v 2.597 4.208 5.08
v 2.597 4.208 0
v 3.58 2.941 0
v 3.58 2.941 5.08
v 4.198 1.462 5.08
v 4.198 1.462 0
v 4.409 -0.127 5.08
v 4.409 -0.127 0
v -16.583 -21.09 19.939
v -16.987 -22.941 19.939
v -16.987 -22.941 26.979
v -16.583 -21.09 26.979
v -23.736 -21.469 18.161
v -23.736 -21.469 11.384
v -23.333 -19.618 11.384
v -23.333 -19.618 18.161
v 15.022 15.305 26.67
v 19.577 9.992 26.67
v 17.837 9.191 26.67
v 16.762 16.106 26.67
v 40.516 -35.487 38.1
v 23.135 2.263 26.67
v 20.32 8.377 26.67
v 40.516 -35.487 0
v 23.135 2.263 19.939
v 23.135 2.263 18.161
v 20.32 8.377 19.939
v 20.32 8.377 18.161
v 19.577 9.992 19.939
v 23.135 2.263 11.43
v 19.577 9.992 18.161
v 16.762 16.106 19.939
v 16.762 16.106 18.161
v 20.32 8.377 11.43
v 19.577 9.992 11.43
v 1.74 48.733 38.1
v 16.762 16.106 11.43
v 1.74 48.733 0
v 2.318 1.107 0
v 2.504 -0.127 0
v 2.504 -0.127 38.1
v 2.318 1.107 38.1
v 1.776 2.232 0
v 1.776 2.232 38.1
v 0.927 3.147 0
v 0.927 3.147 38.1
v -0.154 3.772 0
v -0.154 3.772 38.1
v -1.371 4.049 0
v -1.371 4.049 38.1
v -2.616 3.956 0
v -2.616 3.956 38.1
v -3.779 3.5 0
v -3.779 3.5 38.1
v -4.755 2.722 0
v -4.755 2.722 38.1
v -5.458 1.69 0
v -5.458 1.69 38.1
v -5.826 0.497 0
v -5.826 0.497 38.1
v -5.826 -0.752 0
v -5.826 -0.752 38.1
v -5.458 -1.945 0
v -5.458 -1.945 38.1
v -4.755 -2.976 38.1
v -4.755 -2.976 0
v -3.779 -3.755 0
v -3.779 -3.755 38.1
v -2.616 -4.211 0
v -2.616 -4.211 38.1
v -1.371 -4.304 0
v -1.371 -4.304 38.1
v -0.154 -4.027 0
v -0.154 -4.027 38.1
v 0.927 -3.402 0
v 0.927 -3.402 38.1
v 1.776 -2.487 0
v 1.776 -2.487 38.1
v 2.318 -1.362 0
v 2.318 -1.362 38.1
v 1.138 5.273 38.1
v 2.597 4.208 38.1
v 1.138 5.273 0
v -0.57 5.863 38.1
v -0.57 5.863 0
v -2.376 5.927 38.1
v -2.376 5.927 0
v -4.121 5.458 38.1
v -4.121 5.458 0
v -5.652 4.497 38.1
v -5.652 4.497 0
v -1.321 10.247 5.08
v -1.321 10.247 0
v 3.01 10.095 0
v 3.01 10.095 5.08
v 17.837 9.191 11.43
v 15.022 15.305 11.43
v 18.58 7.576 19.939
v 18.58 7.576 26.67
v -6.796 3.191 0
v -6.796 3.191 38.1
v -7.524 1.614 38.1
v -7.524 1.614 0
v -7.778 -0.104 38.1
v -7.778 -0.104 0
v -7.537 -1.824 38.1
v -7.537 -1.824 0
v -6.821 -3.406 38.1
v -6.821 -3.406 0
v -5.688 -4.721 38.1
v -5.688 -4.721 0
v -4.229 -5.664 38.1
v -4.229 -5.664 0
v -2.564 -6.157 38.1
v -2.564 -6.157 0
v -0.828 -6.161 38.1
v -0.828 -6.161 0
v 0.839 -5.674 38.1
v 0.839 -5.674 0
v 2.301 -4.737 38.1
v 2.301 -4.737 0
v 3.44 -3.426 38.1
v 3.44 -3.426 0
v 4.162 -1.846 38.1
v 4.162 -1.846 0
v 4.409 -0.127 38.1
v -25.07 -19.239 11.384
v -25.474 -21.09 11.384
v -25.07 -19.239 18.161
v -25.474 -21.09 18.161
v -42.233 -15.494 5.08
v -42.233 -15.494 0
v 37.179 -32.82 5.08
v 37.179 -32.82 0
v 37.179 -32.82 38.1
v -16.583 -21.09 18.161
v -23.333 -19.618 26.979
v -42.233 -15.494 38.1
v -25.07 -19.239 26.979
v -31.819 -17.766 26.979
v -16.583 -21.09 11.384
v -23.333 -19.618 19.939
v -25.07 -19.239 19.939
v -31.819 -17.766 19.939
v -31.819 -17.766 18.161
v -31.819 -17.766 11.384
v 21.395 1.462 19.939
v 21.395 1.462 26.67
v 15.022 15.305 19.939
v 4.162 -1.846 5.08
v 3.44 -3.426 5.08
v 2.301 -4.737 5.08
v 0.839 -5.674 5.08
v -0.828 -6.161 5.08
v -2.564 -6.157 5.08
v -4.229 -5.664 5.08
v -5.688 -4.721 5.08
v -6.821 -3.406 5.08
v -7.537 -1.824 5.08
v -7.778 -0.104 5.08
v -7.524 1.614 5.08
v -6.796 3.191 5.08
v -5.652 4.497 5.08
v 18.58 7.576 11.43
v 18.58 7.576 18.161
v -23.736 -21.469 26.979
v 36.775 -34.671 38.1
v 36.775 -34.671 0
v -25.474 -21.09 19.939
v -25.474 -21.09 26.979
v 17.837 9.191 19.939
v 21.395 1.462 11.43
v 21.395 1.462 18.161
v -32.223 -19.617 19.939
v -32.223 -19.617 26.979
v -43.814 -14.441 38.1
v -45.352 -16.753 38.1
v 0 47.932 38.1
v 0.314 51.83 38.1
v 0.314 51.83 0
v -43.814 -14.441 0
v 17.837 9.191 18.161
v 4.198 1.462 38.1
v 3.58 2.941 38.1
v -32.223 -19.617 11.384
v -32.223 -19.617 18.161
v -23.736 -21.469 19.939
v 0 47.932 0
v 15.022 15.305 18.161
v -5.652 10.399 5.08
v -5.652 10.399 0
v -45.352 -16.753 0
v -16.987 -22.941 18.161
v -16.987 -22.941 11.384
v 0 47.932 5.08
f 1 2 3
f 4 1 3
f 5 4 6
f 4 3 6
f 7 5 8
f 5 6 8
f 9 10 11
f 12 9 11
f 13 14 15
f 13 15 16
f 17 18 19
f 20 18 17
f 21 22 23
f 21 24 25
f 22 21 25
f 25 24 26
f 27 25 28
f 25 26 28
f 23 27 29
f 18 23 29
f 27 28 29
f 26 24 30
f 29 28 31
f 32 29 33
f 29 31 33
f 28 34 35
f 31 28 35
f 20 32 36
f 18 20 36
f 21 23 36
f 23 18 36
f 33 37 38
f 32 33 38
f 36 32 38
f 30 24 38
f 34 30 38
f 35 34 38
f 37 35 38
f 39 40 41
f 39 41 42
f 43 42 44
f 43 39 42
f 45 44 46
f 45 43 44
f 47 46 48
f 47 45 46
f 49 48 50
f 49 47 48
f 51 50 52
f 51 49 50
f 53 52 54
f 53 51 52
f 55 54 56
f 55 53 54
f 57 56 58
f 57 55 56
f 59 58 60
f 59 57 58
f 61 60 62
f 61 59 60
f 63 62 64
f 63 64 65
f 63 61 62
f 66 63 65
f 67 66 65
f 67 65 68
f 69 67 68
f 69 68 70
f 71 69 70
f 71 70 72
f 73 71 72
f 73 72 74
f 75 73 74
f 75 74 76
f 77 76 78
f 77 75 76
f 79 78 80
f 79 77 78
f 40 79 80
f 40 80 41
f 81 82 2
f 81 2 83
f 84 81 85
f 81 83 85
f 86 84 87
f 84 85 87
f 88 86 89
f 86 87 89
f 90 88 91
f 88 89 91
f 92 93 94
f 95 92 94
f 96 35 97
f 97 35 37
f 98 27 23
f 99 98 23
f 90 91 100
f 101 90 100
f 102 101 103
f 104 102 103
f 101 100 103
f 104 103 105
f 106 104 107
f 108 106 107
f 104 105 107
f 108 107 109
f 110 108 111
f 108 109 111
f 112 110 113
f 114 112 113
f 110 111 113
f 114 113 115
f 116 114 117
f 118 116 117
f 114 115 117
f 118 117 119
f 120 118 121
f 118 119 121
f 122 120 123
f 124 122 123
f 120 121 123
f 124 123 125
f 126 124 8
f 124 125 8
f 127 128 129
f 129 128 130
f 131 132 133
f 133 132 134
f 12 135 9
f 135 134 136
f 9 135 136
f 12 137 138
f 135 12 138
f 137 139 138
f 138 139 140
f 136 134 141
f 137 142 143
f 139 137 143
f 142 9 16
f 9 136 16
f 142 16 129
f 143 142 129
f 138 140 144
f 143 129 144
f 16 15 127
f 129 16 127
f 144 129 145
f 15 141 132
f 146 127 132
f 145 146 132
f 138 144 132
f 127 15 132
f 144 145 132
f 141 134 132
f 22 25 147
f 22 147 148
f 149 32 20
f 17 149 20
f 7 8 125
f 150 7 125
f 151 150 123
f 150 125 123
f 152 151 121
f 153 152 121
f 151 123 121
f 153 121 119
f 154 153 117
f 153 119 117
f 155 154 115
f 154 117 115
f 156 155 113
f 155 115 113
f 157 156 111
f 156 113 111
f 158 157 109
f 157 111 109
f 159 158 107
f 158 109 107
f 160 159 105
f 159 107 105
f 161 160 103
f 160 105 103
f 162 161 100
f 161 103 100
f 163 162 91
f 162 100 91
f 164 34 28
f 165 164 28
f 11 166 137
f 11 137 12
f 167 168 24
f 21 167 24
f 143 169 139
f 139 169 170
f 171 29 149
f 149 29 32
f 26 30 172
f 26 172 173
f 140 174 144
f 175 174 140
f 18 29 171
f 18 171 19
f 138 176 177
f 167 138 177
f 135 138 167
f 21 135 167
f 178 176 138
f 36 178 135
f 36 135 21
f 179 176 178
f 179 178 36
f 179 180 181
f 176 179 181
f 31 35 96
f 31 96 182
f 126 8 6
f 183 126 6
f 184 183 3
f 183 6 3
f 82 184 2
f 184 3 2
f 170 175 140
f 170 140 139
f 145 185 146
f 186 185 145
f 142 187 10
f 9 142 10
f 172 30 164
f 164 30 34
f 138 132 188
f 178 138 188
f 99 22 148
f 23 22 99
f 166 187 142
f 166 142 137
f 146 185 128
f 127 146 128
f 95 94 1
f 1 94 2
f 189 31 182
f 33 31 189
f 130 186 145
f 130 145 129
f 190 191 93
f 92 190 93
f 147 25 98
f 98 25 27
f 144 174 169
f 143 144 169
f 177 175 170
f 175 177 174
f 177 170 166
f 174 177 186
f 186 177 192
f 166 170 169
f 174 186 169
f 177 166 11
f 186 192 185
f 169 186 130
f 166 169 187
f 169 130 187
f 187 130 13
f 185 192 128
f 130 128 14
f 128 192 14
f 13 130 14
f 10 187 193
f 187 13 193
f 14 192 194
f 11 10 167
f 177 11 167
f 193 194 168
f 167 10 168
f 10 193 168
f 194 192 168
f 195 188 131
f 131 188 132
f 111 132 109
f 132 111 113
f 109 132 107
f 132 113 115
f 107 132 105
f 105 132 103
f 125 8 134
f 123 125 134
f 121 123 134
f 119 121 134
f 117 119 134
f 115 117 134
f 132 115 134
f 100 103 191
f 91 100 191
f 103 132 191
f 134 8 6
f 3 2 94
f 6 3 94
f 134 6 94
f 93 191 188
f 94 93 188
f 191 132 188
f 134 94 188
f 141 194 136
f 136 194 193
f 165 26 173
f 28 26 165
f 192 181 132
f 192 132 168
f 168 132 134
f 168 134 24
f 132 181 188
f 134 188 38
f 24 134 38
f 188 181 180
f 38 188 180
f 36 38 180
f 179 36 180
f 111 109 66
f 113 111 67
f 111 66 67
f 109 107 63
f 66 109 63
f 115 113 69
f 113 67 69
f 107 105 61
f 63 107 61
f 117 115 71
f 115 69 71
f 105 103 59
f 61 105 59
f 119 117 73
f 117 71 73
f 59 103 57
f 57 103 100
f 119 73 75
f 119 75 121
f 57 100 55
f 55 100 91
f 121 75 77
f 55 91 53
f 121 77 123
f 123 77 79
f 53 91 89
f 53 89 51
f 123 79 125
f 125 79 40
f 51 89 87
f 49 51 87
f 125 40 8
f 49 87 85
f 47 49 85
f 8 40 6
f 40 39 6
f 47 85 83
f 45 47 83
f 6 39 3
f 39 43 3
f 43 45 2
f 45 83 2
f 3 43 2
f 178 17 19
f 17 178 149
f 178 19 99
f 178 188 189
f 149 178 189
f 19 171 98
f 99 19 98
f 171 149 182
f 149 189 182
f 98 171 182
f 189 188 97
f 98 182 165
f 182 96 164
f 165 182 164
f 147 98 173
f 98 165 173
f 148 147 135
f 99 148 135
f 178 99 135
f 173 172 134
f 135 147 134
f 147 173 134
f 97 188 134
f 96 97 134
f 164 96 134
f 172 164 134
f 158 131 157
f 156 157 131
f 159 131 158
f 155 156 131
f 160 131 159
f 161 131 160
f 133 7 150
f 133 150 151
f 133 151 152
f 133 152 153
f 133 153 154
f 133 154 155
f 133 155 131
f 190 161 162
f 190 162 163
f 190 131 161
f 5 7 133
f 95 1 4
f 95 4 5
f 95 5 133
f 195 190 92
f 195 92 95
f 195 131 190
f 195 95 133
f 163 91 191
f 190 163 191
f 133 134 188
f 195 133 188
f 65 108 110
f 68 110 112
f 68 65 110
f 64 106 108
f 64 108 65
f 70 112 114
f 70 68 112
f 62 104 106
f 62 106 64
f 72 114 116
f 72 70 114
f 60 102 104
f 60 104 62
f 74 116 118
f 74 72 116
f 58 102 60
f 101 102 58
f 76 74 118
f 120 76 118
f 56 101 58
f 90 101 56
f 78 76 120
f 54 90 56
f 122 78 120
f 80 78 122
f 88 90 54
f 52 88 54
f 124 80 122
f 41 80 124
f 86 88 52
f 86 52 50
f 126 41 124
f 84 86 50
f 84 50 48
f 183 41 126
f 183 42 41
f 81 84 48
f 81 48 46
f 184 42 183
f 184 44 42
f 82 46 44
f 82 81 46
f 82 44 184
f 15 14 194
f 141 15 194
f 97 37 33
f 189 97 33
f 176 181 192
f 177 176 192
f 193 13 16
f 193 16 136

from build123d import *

# Parameters (mm, degrees)
F1_DEPTH = 38.1
F0_R     = 4.1886124366
F2_DEPTH = 5.08
F3_W     = 6.9084239401
F3_H     = 7.0400872709
F3_H_2   = 6.7767606093
F4_DEPTH = 1.905
F5_W     = 6.731
F5_H     = 6.731
F6_DEPTH = 2.54


with BuildPart() as f1:
    # F0 (on Top) → F1 (new body)
    with BuildSketch(Plane.XY):
        Polygon((0.3138544264, 51.8303324458), (-43.813505187, -14.4413347066), (-45.3524620612, -16.7525819378), (36.7754336205, -34.671347872), (40.5160950538, -35.4874900135), (1.7399032001, 48.7330057371), align=None)
        Polygon((-42.2325333996, -15.4940335989), (0, 47.9319320828), (37.1793172874, -32.8202094742), align=None, mode=Mode.SUBTRACT)
    extrude(amount=F1_DEPTH)

    # F3 (on face) → F4 (cut)
    with BuildSketch(Plane(origin=(-5.5498260355, -25.4367703319, 0), x_dir=(0.9770158795, -0.2131665339, 0), z_dir=(-0.2131665339, -0.9770158795, 0))):
        with Locations((-23.8466220251, 23.4590436355)):
            Rectangle(F3_W, F3_H)
        with Locations((-23.8466220251, 14.7726196953)):
            Rectangle(F3_W, F3_H_2)
        with Locations((-15.1601980849, 14.7726196953)):
            Rectangle(F3_W, F3_H_2)
        with Locations((-15.1601980849, 23.4590436355)):
            Rectangle(F3_W, F3_H)
    extrude(amount=-F4_DEPTH, mode=Mode.SUBTRACT)

    # F5 (on face) → F6 (cut)
    with BuildSketch(Plane(origin=(19.9485164965, 9.1845517647, 0), x_dir=(-0.4182150426, 0.908348049, 0), z_dir=(0.908348049, 0.4182150426, 0))):
        with Locations((-4.2545, 23.3045)):
            Rectangle(F5_W, F5_H)
        with Locations((-4.2545, 14.7955)):
            Rectangle(F5_W, F5_H)
        with Locations((4.2545, 14.7955)):
            Rectangle(F5_W, F5_H)
        with Locations((4.2545, 23.3045)):
            Rectangle(F5_W, F5_H)
    extrude(amount=-F6_DEPTH, mode=Mode.SUBTRACT)


with BuildPart() as f1b:
    # F0 (on Top) → F1, piece 2 (new body)
    with BuildSketch(Plane.XY):
        with BuildLine():
            ThreePointArc((-5.6520700455, 4.4974683597), (-4.2294693897, -5.6641112392), (4.4092070658, -0.1274369968))
            ThreePointArc((4.4092070658, -0.1274369968), (3.9380171559, 2.222132636), (2.5973171511, 4.2083403007))
            ThreePointArc((2.5973171511, 4.2083403007), (-1.4709648838, 5.9624362109), (-5.6520700455, 4.4974683597))
        make_face()
        with Locations((-1.6844053707, -0.1274369968)):
            Circle(F0_R, mode=Mode.SUBTRACT)
    extrude(amount=F1_DEPTH)


with BuildPart() as f2:
    # F0 (on Top) → F2 (new body)
    with BuildSketch(Plane.XY):
        Polygon((37.1793172874, -32.8202094742), (0, 47.9319320828), (-42.2325333996, -15.4940335989), align=None)
        with BuildLine():
            ThreePointArc((2.5973171511, 4.2083403007), (3.9380171559, 2.222132636), (4.4092070658, -0.1274369968))
            ThreePointArc((4.4092070658, -0.1274369968), (-4.2294693897, -5.6641112392), (-5.6520700455, 4.4974683597))
            Line((-5.6520700455, 4.4974683597), (-5.6520700455, 10.3990221396))
            Line((-5.6520700455, 10.3990221396), (-1.3207900295, 10.2472175808))
            Line((-1.3207900295, 10.2472175808), (3.0104899866, 10.0954130219))
            Line((3.0104899866, 10.0954130219), (2.5973171511, 4.2083403007))
        make_face(mode=Mode.SUBTRACT)
    extrude(amount=F2_DEPTH)


solid = Compound([f1.part, f1b.part, f2.part])
